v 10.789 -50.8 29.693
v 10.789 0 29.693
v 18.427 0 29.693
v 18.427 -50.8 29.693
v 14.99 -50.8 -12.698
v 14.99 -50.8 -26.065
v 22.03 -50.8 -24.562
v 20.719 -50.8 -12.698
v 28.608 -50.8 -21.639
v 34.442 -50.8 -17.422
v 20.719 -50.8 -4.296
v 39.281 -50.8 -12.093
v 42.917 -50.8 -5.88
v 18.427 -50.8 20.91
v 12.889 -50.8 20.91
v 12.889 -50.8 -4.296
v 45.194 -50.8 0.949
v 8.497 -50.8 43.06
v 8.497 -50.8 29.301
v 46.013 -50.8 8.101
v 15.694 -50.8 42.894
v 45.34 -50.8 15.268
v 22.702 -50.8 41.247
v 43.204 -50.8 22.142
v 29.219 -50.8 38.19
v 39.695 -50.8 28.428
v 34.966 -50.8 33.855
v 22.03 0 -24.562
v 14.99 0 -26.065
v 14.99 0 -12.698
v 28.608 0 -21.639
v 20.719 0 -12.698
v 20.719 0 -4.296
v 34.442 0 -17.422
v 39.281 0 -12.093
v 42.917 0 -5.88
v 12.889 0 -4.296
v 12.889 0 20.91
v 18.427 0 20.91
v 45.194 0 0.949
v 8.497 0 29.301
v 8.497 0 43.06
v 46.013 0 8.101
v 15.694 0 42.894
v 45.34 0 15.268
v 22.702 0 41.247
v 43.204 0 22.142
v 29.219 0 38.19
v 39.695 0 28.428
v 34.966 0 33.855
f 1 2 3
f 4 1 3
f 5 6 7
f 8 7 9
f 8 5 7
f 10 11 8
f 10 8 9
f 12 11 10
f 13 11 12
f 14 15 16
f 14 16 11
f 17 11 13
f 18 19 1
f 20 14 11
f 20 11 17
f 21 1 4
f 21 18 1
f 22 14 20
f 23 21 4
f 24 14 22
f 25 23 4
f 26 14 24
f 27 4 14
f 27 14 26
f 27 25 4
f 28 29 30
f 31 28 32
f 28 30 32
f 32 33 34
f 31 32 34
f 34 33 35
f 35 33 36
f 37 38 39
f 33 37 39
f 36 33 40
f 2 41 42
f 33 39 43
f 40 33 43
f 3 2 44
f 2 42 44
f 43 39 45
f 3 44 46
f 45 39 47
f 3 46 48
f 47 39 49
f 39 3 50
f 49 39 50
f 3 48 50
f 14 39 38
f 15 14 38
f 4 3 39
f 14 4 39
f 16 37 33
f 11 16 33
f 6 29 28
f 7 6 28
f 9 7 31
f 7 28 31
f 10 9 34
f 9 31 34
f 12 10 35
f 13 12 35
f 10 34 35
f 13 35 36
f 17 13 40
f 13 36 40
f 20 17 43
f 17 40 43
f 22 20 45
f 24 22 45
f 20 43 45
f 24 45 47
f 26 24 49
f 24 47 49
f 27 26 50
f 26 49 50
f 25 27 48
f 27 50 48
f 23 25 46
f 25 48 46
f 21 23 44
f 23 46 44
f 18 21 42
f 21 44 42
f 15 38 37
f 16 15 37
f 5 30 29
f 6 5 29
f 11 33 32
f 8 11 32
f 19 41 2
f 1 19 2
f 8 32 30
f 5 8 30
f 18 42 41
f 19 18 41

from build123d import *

# Parameters (mm, degrees)
F1_DEPTH = 50.8


with BuildPart() as f1:
    # F0 (on Front) → F1 (new body)
    with BuildSketch(Plane.XZ):
        with BuildLine():
            Line((14.989941, -12.698484), (14.989941, -26.06531))
            ThreePointArc((14.989941, -26.06531), (45.86306, 11.702062), (8.497481, 43.060273))
            Line((8.497481, 43.060273), (10.788937, 29.693447))
            Line((10.788937, 29.693447), (18.427124, 29.693447))
            Line((18.427124, 29.693447), (18.427124, 20.909535))
            Line((18.427124, 20.909535), (12.889439, 20.909535))
            Line((12.889439, 20.909535), (12.889439, -4.29648))
            Line((12.889439, -4.29648), (20.71858, -4.29648))
            Line((20.71858, -4.29648), (20.71858, -12.698484))
            Line((20.71858, -12.698484), (14.989941, -12.698484))
        make_face()
        Polygon((10.788937, 29.693447), (8.497481, 43.060273), (8.497481, 29.300626), align=None)
    extrude(amount=F1_DEPTH)


solid = f1.part
